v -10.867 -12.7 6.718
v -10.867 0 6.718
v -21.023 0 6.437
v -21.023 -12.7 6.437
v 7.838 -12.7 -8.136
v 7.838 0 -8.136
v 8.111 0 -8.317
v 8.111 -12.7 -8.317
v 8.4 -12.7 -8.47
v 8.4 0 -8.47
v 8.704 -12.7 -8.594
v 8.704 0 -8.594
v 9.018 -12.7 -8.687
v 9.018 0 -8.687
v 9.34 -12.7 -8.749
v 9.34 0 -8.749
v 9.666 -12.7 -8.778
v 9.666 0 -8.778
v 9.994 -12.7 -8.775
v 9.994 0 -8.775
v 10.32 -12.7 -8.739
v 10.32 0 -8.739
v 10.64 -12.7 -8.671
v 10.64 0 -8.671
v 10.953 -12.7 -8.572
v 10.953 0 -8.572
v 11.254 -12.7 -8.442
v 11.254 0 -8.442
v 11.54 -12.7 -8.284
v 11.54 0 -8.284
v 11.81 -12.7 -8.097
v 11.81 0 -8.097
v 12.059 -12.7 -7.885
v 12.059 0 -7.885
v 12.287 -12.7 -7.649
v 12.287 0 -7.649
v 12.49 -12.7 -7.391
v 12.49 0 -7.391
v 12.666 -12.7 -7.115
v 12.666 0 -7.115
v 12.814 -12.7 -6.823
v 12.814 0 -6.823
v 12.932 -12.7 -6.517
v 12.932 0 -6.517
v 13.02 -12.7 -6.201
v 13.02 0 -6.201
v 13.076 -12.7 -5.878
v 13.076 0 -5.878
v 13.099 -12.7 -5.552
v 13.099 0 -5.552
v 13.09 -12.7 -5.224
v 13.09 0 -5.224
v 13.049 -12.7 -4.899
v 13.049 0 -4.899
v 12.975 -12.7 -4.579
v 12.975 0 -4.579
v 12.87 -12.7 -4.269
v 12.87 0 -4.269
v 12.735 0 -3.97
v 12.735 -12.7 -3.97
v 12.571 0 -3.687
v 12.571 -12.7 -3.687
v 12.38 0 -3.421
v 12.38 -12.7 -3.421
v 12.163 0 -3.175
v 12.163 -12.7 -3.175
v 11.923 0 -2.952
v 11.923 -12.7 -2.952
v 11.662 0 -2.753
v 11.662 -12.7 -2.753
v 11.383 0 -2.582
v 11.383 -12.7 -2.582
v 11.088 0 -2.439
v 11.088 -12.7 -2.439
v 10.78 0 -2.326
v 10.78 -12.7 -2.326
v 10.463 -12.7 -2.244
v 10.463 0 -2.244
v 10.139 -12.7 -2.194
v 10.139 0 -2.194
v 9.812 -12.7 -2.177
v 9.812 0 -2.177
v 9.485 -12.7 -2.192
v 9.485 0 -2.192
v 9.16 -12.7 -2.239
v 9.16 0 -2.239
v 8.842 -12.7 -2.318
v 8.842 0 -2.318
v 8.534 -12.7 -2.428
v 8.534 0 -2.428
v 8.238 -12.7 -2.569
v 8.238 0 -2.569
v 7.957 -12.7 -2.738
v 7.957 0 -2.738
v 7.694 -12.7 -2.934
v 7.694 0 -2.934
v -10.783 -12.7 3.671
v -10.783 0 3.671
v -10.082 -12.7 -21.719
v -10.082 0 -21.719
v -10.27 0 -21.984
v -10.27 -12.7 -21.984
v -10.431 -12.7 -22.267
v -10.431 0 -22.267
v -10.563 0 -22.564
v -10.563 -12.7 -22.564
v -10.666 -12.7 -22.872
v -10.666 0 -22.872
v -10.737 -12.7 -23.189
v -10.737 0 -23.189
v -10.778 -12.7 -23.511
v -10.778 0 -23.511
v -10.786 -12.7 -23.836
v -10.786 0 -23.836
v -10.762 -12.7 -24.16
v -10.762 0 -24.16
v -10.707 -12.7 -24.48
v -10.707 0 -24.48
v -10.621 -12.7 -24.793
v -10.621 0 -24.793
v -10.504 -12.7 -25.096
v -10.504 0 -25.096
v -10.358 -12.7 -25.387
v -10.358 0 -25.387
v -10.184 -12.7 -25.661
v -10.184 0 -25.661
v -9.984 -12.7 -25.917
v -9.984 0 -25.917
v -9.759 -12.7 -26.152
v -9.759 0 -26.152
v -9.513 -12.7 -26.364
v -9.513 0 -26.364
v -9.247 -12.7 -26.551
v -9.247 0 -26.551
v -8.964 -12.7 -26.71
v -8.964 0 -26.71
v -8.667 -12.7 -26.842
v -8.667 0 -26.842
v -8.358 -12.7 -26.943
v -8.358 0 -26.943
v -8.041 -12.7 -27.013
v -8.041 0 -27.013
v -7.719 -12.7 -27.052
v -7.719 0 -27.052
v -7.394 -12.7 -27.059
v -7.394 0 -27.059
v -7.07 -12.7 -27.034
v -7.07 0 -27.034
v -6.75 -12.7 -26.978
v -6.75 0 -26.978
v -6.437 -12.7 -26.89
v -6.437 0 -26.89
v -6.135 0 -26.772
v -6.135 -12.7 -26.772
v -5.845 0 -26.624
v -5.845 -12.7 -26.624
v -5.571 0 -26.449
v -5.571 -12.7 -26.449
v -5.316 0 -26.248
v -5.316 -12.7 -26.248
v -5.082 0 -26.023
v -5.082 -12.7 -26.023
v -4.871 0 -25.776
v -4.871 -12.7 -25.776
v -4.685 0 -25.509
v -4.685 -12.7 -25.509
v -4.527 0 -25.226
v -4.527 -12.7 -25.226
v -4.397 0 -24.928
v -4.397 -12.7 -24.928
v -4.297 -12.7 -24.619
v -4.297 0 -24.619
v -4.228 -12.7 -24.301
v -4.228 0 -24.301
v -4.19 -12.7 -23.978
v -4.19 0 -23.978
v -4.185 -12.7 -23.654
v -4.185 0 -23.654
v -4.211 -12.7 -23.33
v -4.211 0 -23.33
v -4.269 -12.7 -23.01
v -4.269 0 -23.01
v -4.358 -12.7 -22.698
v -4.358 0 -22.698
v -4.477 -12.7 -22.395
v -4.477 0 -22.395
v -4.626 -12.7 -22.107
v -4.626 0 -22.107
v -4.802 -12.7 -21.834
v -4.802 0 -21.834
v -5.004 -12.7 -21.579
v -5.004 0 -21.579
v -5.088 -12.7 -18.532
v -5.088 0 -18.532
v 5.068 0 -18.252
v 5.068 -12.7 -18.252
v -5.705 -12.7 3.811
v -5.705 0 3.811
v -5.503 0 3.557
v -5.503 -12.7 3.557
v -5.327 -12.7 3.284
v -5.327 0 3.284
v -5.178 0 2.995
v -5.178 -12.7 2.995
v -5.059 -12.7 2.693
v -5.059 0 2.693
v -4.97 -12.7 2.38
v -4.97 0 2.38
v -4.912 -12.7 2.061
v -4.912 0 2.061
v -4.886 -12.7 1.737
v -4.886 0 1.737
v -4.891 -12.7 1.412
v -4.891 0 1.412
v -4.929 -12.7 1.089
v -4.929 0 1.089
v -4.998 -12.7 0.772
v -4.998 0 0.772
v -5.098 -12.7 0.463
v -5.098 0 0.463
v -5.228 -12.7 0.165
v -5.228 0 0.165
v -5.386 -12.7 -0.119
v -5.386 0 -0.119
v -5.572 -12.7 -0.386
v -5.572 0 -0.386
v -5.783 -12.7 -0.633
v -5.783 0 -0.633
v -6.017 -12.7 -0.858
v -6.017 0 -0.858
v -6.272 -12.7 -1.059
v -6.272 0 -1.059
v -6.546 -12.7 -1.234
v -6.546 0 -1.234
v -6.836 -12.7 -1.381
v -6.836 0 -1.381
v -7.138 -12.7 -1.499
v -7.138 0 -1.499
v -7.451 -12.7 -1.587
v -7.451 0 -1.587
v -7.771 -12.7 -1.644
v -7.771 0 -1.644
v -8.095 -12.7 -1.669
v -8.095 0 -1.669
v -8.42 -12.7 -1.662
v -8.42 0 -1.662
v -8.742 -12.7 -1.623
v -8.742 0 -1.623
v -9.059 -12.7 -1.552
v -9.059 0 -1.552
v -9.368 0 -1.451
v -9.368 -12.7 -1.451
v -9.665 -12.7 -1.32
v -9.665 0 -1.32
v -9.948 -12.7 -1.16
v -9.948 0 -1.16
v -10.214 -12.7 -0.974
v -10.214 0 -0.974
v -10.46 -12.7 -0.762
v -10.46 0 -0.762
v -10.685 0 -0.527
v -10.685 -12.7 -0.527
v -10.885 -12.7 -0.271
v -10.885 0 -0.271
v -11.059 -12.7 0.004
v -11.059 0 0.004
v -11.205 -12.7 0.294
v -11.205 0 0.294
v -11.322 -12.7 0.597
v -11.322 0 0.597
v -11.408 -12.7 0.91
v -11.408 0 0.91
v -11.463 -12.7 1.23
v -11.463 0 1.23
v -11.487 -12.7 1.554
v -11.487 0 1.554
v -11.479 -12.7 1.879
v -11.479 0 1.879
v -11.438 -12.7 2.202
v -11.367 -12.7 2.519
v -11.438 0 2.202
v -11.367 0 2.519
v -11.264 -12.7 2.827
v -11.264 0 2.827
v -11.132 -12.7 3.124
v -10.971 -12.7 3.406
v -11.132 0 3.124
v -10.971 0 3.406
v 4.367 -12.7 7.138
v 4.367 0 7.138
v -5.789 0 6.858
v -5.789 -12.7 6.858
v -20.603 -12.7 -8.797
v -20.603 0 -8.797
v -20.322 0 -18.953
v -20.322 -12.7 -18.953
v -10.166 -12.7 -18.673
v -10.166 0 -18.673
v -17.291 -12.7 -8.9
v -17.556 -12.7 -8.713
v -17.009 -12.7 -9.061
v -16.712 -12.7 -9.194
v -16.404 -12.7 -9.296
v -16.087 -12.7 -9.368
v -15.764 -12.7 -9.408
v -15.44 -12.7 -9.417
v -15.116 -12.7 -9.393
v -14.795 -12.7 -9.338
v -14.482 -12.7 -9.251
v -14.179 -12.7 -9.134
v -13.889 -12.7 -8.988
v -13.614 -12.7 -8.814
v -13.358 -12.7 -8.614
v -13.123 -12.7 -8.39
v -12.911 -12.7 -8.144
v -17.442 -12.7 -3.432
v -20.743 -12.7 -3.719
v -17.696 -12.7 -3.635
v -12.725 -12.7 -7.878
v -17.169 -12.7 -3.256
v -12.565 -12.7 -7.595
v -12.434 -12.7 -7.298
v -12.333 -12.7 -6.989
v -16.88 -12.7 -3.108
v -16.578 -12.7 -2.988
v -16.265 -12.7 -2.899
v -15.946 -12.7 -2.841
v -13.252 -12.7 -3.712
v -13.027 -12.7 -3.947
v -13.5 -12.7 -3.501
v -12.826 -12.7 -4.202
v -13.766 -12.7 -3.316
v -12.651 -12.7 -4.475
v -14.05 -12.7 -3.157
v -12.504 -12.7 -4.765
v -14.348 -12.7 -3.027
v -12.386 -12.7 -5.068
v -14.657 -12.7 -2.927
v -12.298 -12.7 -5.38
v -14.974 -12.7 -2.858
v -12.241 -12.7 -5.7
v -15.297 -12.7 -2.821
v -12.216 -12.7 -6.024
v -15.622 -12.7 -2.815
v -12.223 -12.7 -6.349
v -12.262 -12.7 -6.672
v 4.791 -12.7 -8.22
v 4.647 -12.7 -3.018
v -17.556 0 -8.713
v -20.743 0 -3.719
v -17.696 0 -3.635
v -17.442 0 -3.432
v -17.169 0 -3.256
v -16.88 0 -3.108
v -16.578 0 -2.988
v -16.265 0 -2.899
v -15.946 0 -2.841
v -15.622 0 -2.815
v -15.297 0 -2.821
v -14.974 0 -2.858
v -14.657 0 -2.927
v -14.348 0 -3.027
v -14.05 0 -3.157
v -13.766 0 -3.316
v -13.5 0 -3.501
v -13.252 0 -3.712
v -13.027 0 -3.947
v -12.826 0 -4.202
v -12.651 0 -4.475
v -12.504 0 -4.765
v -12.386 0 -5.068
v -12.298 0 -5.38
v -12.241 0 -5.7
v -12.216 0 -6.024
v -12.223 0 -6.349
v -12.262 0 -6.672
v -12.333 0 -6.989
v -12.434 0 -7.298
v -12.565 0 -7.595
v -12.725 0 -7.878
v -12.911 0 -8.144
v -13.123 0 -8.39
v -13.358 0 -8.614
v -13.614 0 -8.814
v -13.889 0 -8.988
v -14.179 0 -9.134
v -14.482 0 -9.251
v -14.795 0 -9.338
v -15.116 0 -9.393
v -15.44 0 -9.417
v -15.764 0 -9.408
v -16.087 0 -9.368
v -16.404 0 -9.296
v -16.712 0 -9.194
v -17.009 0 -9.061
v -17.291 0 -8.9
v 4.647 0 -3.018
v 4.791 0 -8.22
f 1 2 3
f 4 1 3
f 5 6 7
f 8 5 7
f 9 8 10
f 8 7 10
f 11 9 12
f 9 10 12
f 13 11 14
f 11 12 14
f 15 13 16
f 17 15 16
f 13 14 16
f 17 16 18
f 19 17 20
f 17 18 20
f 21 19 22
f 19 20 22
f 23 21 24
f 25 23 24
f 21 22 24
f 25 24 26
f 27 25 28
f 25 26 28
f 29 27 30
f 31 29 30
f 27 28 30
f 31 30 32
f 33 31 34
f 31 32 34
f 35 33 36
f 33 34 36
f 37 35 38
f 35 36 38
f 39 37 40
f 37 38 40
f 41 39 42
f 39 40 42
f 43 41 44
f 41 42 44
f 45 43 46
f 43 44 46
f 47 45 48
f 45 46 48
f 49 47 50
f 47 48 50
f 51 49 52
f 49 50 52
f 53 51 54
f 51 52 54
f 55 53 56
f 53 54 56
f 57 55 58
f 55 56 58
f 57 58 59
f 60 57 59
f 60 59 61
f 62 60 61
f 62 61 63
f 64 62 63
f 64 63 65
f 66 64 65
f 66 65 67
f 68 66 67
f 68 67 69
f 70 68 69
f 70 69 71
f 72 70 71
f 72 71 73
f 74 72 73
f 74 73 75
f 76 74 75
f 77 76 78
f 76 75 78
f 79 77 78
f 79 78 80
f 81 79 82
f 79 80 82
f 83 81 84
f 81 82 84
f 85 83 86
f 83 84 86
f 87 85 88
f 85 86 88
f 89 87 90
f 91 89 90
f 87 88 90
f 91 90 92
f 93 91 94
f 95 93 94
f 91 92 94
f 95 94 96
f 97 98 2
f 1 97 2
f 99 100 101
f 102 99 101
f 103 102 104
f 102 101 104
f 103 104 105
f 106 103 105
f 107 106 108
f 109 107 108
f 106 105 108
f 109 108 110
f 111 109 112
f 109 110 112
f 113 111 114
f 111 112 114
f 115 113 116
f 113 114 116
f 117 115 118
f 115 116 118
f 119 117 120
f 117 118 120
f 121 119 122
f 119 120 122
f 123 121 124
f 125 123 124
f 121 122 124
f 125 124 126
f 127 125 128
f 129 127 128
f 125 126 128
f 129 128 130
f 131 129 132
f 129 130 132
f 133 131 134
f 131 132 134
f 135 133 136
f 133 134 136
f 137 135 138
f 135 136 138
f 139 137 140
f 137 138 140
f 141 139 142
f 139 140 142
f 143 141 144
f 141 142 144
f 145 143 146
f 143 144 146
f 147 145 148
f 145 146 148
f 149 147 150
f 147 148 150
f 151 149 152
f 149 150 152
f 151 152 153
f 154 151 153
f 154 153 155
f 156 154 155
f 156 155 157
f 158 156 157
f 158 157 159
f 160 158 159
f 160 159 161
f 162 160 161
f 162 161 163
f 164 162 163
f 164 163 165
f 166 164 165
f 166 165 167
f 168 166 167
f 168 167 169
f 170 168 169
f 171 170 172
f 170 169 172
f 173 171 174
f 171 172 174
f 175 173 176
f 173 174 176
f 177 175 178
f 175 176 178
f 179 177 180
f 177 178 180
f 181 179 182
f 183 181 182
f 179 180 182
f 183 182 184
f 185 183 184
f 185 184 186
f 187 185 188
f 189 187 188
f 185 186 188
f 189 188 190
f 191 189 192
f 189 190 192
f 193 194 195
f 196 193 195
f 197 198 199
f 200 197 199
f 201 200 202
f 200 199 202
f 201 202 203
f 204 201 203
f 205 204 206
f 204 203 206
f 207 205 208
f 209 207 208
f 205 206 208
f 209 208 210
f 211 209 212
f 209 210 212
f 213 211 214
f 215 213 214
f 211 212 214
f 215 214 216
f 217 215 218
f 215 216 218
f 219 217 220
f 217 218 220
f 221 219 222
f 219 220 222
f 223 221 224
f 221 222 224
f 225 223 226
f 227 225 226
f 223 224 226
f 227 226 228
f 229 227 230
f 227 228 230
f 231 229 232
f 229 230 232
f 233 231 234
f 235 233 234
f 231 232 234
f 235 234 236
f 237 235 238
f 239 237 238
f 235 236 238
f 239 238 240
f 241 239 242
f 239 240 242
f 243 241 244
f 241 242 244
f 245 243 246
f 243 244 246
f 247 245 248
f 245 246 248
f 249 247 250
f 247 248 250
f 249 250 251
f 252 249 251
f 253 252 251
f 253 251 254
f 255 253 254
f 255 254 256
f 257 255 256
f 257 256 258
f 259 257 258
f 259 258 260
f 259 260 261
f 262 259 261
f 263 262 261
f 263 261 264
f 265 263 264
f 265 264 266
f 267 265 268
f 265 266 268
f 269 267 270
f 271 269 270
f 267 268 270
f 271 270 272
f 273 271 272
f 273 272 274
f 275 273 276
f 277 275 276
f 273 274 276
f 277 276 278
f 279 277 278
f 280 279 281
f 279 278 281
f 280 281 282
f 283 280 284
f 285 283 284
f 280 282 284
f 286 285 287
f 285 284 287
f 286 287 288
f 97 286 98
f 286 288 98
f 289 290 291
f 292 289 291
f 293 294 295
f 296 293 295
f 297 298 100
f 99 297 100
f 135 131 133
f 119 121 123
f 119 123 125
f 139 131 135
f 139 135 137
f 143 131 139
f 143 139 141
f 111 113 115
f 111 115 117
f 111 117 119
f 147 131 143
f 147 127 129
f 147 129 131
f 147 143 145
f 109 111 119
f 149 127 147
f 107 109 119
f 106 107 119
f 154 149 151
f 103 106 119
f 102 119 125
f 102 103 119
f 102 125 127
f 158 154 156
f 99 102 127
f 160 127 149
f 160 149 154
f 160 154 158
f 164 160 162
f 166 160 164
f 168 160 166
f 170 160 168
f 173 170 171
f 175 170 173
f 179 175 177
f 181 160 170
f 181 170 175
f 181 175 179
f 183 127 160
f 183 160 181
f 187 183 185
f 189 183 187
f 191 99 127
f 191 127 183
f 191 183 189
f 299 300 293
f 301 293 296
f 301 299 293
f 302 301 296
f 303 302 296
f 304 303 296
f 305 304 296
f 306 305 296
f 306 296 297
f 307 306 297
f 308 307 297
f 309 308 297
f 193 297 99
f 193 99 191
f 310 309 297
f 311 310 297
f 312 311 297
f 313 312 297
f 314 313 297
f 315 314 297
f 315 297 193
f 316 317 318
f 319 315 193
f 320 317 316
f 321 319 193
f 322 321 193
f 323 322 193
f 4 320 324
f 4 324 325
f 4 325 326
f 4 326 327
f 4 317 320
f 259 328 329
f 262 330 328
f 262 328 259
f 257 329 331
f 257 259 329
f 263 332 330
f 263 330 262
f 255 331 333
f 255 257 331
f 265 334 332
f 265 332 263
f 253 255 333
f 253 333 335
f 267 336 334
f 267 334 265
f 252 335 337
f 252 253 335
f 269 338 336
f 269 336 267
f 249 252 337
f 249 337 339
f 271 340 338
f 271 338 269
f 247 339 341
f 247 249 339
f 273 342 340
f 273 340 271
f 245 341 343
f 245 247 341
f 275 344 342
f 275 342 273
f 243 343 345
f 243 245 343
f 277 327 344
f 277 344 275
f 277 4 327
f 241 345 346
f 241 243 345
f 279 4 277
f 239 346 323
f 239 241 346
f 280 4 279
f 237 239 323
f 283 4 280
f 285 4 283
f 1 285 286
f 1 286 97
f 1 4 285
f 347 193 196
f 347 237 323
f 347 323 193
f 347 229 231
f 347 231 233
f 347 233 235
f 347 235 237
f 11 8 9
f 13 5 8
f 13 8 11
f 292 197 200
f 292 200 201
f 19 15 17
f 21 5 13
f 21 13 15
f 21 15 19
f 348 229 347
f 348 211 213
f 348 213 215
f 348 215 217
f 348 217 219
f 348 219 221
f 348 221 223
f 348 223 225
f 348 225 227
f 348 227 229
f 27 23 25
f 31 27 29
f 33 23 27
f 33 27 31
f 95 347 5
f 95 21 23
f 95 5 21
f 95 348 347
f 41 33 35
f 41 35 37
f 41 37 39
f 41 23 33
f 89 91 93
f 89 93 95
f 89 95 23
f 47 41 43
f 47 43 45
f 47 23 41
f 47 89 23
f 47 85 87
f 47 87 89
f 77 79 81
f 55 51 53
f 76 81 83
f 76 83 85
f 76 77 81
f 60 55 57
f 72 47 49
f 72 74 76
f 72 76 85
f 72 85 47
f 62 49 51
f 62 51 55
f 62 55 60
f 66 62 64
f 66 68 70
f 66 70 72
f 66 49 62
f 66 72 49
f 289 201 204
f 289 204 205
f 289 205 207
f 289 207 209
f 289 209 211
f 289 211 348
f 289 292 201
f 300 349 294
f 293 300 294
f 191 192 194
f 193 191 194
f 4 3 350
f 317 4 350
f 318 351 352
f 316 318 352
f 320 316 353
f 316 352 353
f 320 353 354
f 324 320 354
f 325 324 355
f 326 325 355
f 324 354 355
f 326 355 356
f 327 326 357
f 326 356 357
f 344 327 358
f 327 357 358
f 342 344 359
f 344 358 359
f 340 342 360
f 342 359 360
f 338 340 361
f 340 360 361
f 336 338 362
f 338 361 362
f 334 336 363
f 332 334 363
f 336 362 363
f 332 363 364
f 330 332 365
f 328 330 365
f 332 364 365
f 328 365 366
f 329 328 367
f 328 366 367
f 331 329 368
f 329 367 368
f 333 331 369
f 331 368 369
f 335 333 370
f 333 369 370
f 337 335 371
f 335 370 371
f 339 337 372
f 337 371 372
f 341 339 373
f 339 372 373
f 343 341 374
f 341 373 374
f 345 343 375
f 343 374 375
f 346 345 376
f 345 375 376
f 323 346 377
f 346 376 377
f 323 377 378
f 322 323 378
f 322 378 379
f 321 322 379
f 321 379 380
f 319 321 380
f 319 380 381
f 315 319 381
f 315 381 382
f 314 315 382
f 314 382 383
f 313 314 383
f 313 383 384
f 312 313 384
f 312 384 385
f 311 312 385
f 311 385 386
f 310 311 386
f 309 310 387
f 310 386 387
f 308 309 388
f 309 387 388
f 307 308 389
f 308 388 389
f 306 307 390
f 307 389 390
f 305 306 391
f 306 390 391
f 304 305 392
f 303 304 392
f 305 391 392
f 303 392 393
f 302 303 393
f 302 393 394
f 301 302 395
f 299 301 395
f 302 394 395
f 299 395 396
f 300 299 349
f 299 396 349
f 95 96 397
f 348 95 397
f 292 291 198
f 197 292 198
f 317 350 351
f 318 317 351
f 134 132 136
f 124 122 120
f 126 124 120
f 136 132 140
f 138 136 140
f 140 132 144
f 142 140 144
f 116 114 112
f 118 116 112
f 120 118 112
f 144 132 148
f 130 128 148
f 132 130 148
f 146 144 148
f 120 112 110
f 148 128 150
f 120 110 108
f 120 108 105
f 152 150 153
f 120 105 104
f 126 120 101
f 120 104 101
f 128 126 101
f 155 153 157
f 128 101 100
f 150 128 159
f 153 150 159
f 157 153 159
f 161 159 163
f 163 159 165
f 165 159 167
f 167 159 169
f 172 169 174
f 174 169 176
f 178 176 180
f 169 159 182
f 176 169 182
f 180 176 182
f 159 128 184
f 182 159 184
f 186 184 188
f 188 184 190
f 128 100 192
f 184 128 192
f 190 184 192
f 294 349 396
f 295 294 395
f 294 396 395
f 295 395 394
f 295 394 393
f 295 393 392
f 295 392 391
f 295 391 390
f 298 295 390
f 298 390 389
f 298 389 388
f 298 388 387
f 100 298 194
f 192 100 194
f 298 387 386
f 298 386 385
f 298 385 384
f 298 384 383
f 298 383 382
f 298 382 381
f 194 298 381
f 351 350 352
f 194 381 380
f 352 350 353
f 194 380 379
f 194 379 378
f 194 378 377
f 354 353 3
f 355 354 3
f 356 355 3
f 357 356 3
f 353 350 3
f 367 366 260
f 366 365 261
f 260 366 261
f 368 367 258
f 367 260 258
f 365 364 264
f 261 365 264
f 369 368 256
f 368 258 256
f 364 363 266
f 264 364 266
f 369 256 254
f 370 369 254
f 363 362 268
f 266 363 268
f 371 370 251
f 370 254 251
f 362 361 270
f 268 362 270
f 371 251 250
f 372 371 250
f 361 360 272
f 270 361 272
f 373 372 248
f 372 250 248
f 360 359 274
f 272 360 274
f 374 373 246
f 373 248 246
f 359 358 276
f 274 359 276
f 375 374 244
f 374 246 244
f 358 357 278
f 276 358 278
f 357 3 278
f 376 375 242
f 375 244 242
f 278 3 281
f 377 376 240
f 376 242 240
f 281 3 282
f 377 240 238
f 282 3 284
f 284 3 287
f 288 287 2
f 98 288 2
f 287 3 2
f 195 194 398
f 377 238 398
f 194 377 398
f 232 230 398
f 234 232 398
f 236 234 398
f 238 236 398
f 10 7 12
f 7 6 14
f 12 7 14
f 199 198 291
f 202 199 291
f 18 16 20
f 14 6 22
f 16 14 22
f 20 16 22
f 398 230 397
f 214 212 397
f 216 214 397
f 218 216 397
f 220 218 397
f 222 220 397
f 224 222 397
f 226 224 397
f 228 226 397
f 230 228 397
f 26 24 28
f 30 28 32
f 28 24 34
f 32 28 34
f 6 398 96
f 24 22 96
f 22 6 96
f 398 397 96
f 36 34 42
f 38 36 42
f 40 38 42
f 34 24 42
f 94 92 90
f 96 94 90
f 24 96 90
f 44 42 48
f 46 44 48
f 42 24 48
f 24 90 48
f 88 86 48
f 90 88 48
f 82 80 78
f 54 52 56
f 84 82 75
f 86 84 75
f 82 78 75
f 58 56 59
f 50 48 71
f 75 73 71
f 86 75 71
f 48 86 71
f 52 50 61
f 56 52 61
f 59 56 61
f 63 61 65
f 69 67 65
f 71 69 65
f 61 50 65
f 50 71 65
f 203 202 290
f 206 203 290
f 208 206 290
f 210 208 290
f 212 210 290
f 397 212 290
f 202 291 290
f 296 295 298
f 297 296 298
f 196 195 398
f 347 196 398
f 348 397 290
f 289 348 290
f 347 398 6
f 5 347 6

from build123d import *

# Parameters (mm, degrees)
F1_DEPTH = 12.7


with BuildPart() as f1:
    # F0 (on Front) → F1 (new body)
    with BuildSketch(Plane.XZ):
        with BuildLine():
            Line((-10.867325, 6.717781), (-21.023455, 6.437397))
            Line((-21.023455, 6.437397), (-20.743071, -3.718733))
            Line((-20.743071, -3.718733), (-17.696232, -3.634618))
            ThreePointArc((-17.696232, -3.634618), (-12.216315, -6.0243), (-17.55604, -8.712683))
            Line((-17.55604, -8.712683), (-20.602879, -8.796799))
            Line((-20.602879, -8.796799), (-20.322495, -18.952929))
            Line((-20.322495, -18.952929), (-10.166365, -18.672545))
            Line((-10.166365, -18.672545), (-5.088299, -18.532353))
            Line((-5.088299, -18.532353), (5.067831, -18.251969))
            Line((5.067831, -18.251969), (4.790878, -8.220124))
            Line((4.790878, -8.220124), (4.647255, -3.017773))
            Line((4.647255, -3.017773), (4.366871, 7.138357))
            Line((4.366871, 7.138357), (-5.78926, 6.857973))
            Line((-5.78926, 6.857973), (-5.705144, 3.811134))
            ThreePointArc((-5.705144, 3.811134), (-8.094826, -1.668783), (-10.78321, 3.670942))
            Line((-10.78321, 3.670942), (-10.867325, 6.717781))
        make_face()
        with BuildLine():
            Line((-5.088299, -18.532353), (-10.166365, -18.672545))
            Line((-10.166365, -18.672545), (-10.082249, -21.719384))
            ThreePointArc((-10.082249, -21.719384), (-7.393866, -27.059109), (-5.004184, -21.579192))
            Line((-5.004184, -21.579192), (-5.088299, -18.532353))
        make_face()
        with BuildLine():
            Line((7.694094, -2.933658), (4.647255, -3.017773))
            Line((4.647255, -3.017773), (4.790878, -8.220124))
            Line((4.790878, -8.220124), (7.837717, -8.136009))
            ThreePointArc((7.837717, -8.136009), (13.098589, -5.387612), (7.694094, -2.933658))
        make_face()
    extrude(amount=F1_DEPTH)


solid = f1.part
